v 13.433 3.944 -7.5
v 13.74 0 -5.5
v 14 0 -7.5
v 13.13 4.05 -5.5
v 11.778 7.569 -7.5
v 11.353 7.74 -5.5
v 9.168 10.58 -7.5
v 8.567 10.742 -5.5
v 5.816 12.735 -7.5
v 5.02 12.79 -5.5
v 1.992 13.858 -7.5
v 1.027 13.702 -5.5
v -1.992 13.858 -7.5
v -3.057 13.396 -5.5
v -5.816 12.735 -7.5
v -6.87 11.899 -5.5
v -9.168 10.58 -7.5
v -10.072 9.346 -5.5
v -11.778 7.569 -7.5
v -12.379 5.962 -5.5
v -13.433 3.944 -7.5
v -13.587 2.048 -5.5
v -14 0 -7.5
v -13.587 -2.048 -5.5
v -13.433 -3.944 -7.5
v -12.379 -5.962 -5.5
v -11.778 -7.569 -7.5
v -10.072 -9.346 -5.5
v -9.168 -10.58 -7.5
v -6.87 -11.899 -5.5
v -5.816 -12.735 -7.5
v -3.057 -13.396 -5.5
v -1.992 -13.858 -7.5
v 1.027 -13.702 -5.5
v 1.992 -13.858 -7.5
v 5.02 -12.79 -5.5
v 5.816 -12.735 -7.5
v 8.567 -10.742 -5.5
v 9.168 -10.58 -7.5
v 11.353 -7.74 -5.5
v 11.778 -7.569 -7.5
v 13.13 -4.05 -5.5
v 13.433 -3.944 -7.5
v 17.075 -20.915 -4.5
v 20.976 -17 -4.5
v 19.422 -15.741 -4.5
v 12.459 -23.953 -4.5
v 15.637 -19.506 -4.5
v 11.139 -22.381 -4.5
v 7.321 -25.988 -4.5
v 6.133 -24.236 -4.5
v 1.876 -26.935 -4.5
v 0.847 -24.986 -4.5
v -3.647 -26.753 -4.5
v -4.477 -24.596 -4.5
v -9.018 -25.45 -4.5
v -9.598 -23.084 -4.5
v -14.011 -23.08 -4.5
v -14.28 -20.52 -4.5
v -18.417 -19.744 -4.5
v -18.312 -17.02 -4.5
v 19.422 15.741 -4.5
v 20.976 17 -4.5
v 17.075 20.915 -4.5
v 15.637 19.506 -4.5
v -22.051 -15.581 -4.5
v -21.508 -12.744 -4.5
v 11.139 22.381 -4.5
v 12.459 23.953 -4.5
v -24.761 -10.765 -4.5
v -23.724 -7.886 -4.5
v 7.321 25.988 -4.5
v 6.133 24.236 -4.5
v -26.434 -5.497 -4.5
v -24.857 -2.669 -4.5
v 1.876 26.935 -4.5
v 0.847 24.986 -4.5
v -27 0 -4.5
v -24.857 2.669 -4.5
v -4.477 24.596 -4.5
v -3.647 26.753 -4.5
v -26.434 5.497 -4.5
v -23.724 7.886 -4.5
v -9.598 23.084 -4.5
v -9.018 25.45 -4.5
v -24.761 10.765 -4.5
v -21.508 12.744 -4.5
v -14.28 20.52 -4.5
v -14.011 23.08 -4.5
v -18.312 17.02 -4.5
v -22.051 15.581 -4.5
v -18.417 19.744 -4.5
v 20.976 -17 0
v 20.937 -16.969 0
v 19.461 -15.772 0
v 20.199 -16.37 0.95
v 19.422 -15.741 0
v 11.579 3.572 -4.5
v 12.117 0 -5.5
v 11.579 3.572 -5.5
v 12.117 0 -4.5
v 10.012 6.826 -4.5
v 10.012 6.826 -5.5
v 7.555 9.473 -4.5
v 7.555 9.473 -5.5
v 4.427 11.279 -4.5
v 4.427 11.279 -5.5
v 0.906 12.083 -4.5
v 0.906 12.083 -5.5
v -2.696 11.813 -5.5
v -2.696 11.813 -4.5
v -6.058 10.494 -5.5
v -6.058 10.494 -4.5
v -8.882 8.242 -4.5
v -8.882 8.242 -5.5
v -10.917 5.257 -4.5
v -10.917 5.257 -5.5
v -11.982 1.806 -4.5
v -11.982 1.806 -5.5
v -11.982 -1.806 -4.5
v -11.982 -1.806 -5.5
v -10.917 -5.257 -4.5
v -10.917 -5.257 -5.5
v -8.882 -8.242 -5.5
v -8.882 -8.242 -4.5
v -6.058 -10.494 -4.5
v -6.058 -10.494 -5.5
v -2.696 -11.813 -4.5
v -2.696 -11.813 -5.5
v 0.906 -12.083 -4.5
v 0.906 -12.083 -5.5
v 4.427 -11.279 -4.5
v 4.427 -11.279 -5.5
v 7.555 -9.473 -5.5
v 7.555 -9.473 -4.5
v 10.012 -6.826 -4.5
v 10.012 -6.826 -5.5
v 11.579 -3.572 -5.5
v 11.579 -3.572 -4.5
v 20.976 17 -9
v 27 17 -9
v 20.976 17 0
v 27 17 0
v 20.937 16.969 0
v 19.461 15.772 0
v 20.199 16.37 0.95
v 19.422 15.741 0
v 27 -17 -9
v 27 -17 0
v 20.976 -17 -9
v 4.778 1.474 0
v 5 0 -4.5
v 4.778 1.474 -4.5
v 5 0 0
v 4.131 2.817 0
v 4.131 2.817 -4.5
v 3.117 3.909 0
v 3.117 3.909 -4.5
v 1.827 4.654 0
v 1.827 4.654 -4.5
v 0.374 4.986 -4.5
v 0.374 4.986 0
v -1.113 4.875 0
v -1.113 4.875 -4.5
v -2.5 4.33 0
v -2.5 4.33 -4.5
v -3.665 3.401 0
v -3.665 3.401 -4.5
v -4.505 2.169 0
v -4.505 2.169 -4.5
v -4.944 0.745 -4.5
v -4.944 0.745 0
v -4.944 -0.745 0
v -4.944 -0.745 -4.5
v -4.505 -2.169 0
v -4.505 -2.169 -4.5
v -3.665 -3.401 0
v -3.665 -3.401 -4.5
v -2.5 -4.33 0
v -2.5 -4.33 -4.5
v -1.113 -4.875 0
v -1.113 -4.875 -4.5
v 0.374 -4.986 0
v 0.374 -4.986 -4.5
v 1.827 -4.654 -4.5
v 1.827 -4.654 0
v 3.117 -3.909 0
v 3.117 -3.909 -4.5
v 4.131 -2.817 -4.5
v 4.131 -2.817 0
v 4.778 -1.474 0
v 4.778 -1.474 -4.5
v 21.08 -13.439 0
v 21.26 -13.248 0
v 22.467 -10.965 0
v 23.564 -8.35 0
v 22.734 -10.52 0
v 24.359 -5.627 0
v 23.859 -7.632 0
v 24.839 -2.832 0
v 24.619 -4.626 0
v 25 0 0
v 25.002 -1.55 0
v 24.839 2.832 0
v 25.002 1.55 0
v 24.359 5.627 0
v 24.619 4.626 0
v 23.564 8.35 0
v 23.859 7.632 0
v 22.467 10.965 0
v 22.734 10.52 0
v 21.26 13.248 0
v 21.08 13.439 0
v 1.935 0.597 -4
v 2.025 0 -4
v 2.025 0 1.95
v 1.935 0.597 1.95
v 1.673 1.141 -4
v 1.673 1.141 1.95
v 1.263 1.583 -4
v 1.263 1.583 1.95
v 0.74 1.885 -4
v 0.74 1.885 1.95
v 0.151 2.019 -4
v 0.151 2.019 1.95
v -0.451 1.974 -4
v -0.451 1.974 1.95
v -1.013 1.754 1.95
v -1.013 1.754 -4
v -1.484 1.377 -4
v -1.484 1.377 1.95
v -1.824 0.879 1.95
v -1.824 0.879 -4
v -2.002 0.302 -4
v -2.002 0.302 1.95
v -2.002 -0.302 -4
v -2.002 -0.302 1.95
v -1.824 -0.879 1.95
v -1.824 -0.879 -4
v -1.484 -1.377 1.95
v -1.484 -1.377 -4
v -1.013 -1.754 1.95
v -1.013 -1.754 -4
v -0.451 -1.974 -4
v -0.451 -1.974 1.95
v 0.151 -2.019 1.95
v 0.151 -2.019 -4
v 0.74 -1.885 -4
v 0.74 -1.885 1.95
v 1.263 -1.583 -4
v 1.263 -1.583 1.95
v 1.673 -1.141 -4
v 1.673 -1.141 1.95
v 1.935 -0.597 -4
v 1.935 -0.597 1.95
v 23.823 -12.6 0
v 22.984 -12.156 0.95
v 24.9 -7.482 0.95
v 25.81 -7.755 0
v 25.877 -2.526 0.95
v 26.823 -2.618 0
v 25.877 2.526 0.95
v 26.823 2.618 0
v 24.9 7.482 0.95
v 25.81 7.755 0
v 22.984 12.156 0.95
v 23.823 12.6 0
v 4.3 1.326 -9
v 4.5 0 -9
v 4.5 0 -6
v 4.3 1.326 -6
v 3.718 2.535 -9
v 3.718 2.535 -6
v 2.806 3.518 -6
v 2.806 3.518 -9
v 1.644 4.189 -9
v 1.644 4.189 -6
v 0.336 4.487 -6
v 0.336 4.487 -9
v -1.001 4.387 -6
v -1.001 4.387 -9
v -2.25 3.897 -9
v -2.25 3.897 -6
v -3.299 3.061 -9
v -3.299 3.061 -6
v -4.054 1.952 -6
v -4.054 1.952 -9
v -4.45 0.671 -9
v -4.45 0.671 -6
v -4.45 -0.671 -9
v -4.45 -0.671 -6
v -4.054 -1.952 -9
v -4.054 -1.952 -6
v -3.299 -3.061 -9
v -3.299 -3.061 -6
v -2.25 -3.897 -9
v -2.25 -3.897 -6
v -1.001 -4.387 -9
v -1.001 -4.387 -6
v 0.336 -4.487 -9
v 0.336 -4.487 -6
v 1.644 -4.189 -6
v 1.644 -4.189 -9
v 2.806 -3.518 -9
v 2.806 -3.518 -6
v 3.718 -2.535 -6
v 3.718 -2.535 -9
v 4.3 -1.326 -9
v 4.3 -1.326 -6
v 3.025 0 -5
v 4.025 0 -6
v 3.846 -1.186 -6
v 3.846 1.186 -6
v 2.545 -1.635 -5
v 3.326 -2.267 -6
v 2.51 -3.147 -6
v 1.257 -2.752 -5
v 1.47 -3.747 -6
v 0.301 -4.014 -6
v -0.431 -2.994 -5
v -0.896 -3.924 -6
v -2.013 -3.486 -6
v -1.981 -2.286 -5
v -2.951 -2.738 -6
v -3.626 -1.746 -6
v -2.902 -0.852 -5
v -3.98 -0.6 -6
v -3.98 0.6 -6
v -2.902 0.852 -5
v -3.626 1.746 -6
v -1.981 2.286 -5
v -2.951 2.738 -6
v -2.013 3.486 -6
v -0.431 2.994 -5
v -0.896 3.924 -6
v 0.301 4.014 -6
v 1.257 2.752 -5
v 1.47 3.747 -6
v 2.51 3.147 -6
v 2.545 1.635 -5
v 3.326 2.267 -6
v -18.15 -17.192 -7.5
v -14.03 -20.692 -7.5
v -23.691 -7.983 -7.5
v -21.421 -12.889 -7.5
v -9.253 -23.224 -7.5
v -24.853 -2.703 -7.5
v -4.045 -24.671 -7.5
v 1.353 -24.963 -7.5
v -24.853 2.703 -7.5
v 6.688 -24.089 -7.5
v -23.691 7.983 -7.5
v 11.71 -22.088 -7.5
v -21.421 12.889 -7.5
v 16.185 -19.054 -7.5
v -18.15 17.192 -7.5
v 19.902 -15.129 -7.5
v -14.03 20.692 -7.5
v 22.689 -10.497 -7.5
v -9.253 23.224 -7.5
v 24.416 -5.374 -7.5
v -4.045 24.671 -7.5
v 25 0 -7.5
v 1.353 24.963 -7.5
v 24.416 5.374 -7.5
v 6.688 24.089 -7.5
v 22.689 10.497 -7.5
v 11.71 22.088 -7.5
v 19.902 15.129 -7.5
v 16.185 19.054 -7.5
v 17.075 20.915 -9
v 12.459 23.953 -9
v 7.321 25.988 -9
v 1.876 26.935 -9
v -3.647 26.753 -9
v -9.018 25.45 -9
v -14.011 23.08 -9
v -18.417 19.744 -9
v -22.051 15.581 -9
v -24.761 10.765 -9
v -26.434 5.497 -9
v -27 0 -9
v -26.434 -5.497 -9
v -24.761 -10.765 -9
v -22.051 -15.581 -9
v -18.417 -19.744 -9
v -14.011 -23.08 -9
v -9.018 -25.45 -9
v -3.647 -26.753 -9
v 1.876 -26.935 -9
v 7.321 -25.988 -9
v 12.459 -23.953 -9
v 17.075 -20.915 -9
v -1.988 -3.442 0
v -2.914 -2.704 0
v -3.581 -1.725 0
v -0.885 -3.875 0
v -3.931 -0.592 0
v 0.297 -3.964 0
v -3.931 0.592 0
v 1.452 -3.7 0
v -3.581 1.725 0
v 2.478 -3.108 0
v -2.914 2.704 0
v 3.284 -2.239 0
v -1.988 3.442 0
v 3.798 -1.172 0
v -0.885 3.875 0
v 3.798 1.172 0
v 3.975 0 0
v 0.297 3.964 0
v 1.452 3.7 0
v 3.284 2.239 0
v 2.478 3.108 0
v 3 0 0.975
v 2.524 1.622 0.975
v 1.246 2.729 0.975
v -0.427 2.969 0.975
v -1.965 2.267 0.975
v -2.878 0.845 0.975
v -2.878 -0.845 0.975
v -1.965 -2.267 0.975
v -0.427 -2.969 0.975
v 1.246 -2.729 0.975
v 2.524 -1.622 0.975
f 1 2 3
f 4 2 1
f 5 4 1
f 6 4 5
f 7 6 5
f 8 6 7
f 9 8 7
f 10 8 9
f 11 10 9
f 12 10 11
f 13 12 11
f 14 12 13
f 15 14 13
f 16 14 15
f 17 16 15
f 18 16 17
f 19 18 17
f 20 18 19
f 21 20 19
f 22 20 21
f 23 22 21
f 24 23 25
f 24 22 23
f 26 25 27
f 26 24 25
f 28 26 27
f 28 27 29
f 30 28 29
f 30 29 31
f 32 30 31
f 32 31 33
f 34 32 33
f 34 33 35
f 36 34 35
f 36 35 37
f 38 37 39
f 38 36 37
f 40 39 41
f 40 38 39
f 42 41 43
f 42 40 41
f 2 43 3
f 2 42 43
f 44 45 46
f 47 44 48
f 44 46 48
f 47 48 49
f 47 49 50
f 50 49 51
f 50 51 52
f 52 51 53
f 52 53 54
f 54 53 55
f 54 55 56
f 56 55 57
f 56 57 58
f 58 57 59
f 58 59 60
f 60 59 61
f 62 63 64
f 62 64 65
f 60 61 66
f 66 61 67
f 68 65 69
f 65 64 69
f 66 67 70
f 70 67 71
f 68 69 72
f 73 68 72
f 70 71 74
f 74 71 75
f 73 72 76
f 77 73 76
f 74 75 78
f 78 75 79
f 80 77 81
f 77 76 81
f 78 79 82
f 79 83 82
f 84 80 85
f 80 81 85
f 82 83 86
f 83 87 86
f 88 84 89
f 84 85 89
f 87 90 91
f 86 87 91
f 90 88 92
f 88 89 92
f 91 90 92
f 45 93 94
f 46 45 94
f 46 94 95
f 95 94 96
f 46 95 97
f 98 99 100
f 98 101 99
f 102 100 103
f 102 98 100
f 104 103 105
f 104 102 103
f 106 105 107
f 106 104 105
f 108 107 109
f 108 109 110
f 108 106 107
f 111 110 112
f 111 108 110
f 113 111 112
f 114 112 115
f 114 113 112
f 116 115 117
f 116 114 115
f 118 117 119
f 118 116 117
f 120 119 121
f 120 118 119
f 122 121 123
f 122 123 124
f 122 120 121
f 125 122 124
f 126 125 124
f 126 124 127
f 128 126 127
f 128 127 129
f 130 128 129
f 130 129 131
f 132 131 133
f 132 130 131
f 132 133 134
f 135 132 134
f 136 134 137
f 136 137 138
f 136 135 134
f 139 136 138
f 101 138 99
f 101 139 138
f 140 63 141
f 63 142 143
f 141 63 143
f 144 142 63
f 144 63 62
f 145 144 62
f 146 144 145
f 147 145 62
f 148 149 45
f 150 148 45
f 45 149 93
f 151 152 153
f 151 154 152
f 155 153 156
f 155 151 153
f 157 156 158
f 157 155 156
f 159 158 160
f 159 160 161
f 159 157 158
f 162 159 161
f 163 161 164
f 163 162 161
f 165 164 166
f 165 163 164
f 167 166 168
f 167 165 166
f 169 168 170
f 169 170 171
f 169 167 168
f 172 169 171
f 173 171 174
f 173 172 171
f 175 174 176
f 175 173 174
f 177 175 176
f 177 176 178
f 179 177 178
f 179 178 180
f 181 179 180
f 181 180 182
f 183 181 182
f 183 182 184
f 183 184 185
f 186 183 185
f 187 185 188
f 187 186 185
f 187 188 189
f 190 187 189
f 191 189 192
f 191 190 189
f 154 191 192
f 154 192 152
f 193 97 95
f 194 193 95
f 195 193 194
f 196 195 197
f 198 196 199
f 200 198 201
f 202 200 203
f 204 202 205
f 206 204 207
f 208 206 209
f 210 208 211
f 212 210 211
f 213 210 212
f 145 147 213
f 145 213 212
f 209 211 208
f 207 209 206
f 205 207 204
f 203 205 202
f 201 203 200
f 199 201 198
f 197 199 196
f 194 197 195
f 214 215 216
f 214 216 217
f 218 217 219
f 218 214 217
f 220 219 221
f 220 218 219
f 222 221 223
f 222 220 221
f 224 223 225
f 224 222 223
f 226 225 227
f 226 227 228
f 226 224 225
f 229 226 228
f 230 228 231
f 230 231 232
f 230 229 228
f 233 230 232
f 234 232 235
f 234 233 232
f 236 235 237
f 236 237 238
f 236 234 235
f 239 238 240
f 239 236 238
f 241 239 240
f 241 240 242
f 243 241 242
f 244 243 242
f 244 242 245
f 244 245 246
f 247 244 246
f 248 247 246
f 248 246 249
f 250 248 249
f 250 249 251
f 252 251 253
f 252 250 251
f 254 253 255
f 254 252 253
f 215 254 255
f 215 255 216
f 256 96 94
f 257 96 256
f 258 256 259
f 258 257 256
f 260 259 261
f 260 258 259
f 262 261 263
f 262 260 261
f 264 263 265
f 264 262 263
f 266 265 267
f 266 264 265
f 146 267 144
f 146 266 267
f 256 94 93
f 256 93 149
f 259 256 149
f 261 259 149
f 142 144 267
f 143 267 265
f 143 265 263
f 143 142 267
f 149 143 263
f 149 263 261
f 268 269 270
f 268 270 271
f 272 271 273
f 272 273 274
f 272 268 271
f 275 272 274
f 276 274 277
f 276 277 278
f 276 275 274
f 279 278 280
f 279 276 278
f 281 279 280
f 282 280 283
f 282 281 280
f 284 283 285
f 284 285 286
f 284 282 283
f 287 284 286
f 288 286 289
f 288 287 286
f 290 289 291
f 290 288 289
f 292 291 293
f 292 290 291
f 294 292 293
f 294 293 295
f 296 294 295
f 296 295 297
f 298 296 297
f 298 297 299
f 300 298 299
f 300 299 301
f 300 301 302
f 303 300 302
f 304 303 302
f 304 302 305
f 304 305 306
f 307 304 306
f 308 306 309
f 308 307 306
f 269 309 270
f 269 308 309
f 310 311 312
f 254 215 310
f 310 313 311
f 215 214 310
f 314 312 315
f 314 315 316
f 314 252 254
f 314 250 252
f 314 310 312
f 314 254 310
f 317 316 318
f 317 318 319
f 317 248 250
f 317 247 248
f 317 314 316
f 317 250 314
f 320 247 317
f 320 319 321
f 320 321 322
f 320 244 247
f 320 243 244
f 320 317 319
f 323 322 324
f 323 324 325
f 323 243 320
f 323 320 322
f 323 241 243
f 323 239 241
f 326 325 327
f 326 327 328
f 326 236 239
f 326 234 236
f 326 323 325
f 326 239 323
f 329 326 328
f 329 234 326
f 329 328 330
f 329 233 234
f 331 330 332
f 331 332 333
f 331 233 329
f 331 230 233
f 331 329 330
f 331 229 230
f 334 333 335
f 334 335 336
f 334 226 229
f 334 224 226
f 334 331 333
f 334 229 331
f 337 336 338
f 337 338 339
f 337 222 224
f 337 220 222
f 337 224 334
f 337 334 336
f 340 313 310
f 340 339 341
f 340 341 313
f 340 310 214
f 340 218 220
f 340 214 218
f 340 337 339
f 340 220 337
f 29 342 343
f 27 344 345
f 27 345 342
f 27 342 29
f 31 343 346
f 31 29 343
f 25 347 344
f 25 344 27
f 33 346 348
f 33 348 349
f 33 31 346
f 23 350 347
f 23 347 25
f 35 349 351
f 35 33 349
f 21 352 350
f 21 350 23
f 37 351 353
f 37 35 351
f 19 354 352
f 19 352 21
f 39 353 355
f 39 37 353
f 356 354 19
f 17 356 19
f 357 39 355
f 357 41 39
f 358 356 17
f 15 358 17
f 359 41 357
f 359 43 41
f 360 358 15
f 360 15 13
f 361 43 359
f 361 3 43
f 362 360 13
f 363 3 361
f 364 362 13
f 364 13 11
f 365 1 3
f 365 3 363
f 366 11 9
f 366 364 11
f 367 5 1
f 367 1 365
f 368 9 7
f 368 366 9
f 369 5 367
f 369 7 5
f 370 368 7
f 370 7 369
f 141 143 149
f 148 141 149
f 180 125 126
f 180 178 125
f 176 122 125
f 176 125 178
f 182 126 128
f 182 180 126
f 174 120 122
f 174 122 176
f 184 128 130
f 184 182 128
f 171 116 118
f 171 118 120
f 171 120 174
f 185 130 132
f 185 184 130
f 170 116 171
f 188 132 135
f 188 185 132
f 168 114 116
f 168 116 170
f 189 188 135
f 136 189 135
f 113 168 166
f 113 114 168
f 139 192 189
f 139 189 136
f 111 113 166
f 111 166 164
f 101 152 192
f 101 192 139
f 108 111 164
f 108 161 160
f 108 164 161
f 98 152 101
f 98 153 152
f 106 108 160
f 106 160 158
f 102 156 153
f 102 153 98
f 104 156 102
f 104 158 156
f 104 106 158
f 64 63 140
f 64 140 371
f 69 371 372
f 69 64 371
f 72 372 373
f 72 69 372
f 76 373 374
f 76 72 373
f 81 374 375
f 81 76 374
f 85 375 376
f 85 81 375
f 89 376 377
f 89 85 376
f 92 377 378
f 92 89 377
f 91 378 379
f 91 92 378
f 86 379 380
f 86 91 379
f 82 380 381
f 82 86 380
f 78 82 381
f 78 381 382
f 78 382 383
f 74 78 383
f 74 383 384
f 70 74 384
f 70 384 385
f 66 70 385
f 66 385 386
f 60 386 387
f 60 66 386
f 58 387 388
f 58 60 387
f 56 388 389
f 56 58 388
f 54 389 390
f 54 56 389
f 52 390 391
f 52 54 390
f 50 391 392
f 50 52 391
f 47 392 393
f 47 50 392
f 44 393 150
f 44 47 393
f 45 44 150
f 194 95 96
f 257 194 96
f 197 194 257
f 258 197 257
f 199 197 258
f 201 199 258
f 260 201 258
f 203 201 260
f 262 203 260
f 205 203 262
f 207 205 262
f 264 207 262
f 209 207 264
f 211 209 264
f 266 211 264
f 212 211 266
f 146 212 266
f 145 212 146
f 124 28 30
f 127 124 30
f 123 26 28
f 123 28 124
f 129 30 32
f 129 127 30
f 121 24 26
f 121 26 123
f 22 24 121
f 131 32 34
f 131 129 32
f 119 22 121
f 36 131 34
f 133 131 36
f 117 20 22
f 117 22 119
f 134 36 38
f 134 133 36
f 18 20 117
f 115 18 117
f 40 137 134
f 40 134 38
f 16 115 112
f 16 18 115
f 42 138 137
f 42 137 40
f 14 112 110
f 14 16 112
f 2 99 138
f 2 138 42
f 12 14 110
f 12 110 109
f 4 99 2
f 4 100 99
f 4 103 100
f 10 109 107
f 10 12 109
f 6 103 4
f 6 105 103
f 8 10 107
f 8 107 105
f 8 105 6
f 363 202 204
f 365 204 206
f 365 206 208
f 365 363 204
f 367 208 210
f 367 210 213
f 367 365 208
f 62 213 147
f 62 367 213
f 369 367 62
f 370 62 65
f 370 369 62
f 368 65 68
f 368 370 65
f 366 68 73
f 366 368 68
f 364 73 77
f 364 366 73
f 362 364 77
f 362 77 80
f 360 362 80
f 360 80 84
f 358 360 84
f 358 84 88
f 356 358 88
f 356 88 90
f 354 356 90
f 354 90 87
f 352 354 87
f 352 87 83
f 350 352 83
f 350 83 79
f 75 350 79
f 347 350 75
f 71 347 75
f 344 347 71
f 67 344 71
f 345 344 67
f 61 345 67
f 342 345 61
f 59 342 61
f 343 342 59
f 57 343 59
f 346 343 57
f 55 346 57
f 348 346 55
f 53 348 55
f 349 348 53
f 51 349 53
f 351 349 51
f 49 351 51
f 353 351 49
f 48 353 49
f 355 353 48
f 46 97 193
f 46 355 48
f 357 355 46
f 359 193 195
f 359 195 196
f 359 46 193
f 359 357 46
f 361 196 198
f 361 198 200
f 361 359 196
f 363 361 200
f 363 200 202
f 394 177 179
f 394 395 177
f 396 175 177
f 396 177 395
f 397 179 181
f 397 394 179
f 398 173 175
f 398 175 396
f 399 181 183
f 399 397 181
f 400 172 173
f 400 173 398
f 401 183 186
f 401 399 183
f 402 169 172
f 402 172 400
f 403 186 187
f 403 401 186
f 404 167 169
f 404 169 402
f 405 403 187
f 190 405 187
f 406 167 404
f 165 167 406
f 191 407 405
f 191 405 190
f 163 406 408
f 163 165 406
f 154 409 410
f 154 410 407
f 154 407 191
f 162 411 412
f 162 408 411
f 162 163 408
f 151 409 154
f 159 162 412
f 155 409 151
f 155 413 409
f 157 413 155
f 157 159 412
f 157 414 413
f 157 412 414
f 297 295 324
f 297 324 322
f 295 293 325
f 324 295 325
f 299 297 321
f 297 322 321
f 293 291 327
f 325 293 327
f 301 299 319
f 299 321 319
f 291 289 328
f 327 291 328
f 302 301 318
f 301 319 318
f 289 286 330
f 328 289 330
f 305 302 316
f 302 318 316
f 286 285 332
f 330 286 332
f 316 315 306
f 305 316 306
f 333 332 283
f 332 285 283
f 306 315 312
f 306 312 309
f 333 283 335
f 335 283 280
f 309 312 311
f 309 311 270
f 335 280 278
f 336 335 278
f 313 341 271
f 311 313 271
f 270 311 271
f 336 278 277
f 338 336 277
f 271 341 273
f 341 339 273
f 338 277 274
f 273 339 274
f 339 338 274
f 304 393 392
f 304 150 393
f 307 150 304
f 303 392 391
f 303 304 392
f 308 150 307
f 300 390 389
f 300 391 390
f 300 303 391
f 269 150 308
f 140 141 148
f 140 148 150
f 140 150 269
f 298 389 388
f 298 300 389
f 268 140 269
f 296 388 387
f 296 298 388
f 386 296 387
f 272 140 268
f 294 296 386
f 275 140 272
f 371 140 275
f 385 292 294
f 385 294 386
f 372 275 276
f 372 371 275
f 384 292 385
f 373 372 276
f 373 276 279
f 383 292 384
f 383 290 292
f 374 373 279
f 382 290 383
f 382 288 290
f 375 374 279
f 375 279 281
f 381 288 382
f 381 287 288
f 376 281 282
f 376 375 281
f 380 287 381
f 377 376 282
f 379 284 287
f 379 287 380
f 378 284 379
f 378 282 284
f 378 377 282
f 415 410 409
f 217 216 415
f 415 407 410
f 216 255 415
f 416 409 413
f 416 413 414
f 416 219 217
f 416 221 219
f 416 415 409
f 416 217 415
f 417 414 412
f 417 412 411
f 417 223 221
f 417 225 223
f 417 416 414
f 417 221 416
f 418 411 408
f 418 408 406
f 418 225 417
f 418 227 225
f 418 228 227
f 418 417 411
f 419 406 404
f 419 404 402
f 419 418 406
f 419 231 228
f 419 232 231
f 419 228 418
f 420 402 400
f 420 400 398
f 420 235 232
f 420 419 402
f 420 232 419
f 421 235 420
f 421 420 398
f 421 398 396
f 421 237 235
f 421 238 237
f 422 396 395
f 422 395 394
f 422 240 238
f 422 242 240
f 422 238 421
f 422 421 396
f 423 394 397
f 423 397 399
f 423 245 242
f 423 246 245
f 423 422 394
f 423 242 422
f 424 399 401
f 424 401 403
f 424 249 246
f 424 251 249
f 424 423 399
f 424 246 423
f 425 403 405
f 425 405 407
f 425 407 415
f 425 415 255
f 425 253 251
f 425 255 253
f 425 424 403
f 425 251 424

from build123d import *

# Parameters (mm, degrees)
SKETCH009_R     = 70.710678
POCKET004_DEPTH = 9
SKETCH010_R     = 4.5
POCKET005_DEPTH = 3
CHAMFER003_SIZE = 2
SKETCH013_W     = 3
SKETCH013_H     = 9
GROOVE002_ANGLE = 281.954395


with BuildPart() as part:
    # Sketch008 → Revolution002 (revolve)
    with BuildSketch(Plane.XZ):
        Polygon((70.710678, 0), (26.95, 0), (26, 0.95), (25.05, 0), (25, 0), (25, -7.5), (14, -7.5), (13.740136, -5.5), (12.116995, -5.5), (12.116995, -4.5), (5, -4.5), (5, 0), (3.975, 0), (2.025, 1.95), (2.025, -9), (70.710678, -9), align=None)
    revolve(axis=Axis((0, 0, 0), (0, 0, 1)))

    # Sketch012 → Revolution004 (revolve)
    with BuildSketch(Plane.XZ):
        Polygon((31.6, 1.95), (33.6, 1.95), (35.55, 0), (31.6, 0), align=None)
    revolve(axis=Axis((31.6, 0, 13.931554), (0, 0, -1)))

    # Sketch011 → Revolution003 (revolve)
    with BuildSketch(Plane.XZ):
        Polygon((42, 0), (42, 1.95), (44, 1.95), (45.95, 0), align=None)
    revolve(axis=Axis((42, 0, 13.737844), (0, 0, -1)))

    # Sketch009 → Pocket004 (cut, symmetric)
    with BuildSketch(Plane.XY):
        Circle(SKETCH009_R)
        with BuildLine():
            Line((20.976177, 17), (27, 17))
            Line((27, 17), (27, -17))
            Line((27, -17), (20.976177, -17))
            ThreePointArc((20.976177, 17), (-27, 0), (20.976177, -17))
        make_face(mode=Mode.SUBTRACT)
    extrude(amount=POCKET004_DEPTH, both=True, mode=Mode.SUBTRACT)

    # Sketch010 → Pocket005 (cut)
    with BuildSketch(Plane.XY.offset(-9)):
        Circle(SKETCH010_R)
    extrude(amount=POCKET005_DEPTH, mode=Mode.SUBTRACT)

    # Chamfer003
    chamfer003_edges = [part.edges().sort_by_distance(p)[0] for p in [
        (-2.025, 0, -6),
    ]]
    chamfer(chamfer003_edges, length=CHAMFER003_SIZE)

    # Sketch013 → Groove002 (revolve, symmetric, cut)
    with BuildSketch(Plane.XZ) as groove002_sk:
        with Locations((-25.5, 0)):
            Rectangle(SKETCH013_W, SKETCH013_H)
    revolve(axis=Axis((0, 0, 0), (0, 0, 1)), revolution_arc=GROOVE002_ANGLE / 2, mode=Mode.SUBTRACT)
    revolve(groove002_sk.sketch, axis=Axis((0, 0, 0), (0, 0, -1)), revolution_arc=GROOVE002_ANGLE / 2, mode=Mode.SUBTRACT)

    # Sketch017 → Groove004 (revolve, cut)
    with BuildSketch(Plane.XZ):
        Polygon((42, -7), (44, -7), (46, -9), (42, -9), align=None)
    revolve(axis=Axis((42, 0, 18.984909), (0, 0, -1)), mode=Mode.SUBTRACT)

    # Sketch018 → Groove005 (revolve, cut)
    with BuildSketch(Plane.XZ):
        Polygon((31.6, -7), (33.6, -7), (35.6, -9), (31.6, -9), align=None)
    revolve(axis=Axis((31.6, 0, 19.891285), (0, 0, -1)), mode=Mode.SUBTRACT)


solid = part.part
